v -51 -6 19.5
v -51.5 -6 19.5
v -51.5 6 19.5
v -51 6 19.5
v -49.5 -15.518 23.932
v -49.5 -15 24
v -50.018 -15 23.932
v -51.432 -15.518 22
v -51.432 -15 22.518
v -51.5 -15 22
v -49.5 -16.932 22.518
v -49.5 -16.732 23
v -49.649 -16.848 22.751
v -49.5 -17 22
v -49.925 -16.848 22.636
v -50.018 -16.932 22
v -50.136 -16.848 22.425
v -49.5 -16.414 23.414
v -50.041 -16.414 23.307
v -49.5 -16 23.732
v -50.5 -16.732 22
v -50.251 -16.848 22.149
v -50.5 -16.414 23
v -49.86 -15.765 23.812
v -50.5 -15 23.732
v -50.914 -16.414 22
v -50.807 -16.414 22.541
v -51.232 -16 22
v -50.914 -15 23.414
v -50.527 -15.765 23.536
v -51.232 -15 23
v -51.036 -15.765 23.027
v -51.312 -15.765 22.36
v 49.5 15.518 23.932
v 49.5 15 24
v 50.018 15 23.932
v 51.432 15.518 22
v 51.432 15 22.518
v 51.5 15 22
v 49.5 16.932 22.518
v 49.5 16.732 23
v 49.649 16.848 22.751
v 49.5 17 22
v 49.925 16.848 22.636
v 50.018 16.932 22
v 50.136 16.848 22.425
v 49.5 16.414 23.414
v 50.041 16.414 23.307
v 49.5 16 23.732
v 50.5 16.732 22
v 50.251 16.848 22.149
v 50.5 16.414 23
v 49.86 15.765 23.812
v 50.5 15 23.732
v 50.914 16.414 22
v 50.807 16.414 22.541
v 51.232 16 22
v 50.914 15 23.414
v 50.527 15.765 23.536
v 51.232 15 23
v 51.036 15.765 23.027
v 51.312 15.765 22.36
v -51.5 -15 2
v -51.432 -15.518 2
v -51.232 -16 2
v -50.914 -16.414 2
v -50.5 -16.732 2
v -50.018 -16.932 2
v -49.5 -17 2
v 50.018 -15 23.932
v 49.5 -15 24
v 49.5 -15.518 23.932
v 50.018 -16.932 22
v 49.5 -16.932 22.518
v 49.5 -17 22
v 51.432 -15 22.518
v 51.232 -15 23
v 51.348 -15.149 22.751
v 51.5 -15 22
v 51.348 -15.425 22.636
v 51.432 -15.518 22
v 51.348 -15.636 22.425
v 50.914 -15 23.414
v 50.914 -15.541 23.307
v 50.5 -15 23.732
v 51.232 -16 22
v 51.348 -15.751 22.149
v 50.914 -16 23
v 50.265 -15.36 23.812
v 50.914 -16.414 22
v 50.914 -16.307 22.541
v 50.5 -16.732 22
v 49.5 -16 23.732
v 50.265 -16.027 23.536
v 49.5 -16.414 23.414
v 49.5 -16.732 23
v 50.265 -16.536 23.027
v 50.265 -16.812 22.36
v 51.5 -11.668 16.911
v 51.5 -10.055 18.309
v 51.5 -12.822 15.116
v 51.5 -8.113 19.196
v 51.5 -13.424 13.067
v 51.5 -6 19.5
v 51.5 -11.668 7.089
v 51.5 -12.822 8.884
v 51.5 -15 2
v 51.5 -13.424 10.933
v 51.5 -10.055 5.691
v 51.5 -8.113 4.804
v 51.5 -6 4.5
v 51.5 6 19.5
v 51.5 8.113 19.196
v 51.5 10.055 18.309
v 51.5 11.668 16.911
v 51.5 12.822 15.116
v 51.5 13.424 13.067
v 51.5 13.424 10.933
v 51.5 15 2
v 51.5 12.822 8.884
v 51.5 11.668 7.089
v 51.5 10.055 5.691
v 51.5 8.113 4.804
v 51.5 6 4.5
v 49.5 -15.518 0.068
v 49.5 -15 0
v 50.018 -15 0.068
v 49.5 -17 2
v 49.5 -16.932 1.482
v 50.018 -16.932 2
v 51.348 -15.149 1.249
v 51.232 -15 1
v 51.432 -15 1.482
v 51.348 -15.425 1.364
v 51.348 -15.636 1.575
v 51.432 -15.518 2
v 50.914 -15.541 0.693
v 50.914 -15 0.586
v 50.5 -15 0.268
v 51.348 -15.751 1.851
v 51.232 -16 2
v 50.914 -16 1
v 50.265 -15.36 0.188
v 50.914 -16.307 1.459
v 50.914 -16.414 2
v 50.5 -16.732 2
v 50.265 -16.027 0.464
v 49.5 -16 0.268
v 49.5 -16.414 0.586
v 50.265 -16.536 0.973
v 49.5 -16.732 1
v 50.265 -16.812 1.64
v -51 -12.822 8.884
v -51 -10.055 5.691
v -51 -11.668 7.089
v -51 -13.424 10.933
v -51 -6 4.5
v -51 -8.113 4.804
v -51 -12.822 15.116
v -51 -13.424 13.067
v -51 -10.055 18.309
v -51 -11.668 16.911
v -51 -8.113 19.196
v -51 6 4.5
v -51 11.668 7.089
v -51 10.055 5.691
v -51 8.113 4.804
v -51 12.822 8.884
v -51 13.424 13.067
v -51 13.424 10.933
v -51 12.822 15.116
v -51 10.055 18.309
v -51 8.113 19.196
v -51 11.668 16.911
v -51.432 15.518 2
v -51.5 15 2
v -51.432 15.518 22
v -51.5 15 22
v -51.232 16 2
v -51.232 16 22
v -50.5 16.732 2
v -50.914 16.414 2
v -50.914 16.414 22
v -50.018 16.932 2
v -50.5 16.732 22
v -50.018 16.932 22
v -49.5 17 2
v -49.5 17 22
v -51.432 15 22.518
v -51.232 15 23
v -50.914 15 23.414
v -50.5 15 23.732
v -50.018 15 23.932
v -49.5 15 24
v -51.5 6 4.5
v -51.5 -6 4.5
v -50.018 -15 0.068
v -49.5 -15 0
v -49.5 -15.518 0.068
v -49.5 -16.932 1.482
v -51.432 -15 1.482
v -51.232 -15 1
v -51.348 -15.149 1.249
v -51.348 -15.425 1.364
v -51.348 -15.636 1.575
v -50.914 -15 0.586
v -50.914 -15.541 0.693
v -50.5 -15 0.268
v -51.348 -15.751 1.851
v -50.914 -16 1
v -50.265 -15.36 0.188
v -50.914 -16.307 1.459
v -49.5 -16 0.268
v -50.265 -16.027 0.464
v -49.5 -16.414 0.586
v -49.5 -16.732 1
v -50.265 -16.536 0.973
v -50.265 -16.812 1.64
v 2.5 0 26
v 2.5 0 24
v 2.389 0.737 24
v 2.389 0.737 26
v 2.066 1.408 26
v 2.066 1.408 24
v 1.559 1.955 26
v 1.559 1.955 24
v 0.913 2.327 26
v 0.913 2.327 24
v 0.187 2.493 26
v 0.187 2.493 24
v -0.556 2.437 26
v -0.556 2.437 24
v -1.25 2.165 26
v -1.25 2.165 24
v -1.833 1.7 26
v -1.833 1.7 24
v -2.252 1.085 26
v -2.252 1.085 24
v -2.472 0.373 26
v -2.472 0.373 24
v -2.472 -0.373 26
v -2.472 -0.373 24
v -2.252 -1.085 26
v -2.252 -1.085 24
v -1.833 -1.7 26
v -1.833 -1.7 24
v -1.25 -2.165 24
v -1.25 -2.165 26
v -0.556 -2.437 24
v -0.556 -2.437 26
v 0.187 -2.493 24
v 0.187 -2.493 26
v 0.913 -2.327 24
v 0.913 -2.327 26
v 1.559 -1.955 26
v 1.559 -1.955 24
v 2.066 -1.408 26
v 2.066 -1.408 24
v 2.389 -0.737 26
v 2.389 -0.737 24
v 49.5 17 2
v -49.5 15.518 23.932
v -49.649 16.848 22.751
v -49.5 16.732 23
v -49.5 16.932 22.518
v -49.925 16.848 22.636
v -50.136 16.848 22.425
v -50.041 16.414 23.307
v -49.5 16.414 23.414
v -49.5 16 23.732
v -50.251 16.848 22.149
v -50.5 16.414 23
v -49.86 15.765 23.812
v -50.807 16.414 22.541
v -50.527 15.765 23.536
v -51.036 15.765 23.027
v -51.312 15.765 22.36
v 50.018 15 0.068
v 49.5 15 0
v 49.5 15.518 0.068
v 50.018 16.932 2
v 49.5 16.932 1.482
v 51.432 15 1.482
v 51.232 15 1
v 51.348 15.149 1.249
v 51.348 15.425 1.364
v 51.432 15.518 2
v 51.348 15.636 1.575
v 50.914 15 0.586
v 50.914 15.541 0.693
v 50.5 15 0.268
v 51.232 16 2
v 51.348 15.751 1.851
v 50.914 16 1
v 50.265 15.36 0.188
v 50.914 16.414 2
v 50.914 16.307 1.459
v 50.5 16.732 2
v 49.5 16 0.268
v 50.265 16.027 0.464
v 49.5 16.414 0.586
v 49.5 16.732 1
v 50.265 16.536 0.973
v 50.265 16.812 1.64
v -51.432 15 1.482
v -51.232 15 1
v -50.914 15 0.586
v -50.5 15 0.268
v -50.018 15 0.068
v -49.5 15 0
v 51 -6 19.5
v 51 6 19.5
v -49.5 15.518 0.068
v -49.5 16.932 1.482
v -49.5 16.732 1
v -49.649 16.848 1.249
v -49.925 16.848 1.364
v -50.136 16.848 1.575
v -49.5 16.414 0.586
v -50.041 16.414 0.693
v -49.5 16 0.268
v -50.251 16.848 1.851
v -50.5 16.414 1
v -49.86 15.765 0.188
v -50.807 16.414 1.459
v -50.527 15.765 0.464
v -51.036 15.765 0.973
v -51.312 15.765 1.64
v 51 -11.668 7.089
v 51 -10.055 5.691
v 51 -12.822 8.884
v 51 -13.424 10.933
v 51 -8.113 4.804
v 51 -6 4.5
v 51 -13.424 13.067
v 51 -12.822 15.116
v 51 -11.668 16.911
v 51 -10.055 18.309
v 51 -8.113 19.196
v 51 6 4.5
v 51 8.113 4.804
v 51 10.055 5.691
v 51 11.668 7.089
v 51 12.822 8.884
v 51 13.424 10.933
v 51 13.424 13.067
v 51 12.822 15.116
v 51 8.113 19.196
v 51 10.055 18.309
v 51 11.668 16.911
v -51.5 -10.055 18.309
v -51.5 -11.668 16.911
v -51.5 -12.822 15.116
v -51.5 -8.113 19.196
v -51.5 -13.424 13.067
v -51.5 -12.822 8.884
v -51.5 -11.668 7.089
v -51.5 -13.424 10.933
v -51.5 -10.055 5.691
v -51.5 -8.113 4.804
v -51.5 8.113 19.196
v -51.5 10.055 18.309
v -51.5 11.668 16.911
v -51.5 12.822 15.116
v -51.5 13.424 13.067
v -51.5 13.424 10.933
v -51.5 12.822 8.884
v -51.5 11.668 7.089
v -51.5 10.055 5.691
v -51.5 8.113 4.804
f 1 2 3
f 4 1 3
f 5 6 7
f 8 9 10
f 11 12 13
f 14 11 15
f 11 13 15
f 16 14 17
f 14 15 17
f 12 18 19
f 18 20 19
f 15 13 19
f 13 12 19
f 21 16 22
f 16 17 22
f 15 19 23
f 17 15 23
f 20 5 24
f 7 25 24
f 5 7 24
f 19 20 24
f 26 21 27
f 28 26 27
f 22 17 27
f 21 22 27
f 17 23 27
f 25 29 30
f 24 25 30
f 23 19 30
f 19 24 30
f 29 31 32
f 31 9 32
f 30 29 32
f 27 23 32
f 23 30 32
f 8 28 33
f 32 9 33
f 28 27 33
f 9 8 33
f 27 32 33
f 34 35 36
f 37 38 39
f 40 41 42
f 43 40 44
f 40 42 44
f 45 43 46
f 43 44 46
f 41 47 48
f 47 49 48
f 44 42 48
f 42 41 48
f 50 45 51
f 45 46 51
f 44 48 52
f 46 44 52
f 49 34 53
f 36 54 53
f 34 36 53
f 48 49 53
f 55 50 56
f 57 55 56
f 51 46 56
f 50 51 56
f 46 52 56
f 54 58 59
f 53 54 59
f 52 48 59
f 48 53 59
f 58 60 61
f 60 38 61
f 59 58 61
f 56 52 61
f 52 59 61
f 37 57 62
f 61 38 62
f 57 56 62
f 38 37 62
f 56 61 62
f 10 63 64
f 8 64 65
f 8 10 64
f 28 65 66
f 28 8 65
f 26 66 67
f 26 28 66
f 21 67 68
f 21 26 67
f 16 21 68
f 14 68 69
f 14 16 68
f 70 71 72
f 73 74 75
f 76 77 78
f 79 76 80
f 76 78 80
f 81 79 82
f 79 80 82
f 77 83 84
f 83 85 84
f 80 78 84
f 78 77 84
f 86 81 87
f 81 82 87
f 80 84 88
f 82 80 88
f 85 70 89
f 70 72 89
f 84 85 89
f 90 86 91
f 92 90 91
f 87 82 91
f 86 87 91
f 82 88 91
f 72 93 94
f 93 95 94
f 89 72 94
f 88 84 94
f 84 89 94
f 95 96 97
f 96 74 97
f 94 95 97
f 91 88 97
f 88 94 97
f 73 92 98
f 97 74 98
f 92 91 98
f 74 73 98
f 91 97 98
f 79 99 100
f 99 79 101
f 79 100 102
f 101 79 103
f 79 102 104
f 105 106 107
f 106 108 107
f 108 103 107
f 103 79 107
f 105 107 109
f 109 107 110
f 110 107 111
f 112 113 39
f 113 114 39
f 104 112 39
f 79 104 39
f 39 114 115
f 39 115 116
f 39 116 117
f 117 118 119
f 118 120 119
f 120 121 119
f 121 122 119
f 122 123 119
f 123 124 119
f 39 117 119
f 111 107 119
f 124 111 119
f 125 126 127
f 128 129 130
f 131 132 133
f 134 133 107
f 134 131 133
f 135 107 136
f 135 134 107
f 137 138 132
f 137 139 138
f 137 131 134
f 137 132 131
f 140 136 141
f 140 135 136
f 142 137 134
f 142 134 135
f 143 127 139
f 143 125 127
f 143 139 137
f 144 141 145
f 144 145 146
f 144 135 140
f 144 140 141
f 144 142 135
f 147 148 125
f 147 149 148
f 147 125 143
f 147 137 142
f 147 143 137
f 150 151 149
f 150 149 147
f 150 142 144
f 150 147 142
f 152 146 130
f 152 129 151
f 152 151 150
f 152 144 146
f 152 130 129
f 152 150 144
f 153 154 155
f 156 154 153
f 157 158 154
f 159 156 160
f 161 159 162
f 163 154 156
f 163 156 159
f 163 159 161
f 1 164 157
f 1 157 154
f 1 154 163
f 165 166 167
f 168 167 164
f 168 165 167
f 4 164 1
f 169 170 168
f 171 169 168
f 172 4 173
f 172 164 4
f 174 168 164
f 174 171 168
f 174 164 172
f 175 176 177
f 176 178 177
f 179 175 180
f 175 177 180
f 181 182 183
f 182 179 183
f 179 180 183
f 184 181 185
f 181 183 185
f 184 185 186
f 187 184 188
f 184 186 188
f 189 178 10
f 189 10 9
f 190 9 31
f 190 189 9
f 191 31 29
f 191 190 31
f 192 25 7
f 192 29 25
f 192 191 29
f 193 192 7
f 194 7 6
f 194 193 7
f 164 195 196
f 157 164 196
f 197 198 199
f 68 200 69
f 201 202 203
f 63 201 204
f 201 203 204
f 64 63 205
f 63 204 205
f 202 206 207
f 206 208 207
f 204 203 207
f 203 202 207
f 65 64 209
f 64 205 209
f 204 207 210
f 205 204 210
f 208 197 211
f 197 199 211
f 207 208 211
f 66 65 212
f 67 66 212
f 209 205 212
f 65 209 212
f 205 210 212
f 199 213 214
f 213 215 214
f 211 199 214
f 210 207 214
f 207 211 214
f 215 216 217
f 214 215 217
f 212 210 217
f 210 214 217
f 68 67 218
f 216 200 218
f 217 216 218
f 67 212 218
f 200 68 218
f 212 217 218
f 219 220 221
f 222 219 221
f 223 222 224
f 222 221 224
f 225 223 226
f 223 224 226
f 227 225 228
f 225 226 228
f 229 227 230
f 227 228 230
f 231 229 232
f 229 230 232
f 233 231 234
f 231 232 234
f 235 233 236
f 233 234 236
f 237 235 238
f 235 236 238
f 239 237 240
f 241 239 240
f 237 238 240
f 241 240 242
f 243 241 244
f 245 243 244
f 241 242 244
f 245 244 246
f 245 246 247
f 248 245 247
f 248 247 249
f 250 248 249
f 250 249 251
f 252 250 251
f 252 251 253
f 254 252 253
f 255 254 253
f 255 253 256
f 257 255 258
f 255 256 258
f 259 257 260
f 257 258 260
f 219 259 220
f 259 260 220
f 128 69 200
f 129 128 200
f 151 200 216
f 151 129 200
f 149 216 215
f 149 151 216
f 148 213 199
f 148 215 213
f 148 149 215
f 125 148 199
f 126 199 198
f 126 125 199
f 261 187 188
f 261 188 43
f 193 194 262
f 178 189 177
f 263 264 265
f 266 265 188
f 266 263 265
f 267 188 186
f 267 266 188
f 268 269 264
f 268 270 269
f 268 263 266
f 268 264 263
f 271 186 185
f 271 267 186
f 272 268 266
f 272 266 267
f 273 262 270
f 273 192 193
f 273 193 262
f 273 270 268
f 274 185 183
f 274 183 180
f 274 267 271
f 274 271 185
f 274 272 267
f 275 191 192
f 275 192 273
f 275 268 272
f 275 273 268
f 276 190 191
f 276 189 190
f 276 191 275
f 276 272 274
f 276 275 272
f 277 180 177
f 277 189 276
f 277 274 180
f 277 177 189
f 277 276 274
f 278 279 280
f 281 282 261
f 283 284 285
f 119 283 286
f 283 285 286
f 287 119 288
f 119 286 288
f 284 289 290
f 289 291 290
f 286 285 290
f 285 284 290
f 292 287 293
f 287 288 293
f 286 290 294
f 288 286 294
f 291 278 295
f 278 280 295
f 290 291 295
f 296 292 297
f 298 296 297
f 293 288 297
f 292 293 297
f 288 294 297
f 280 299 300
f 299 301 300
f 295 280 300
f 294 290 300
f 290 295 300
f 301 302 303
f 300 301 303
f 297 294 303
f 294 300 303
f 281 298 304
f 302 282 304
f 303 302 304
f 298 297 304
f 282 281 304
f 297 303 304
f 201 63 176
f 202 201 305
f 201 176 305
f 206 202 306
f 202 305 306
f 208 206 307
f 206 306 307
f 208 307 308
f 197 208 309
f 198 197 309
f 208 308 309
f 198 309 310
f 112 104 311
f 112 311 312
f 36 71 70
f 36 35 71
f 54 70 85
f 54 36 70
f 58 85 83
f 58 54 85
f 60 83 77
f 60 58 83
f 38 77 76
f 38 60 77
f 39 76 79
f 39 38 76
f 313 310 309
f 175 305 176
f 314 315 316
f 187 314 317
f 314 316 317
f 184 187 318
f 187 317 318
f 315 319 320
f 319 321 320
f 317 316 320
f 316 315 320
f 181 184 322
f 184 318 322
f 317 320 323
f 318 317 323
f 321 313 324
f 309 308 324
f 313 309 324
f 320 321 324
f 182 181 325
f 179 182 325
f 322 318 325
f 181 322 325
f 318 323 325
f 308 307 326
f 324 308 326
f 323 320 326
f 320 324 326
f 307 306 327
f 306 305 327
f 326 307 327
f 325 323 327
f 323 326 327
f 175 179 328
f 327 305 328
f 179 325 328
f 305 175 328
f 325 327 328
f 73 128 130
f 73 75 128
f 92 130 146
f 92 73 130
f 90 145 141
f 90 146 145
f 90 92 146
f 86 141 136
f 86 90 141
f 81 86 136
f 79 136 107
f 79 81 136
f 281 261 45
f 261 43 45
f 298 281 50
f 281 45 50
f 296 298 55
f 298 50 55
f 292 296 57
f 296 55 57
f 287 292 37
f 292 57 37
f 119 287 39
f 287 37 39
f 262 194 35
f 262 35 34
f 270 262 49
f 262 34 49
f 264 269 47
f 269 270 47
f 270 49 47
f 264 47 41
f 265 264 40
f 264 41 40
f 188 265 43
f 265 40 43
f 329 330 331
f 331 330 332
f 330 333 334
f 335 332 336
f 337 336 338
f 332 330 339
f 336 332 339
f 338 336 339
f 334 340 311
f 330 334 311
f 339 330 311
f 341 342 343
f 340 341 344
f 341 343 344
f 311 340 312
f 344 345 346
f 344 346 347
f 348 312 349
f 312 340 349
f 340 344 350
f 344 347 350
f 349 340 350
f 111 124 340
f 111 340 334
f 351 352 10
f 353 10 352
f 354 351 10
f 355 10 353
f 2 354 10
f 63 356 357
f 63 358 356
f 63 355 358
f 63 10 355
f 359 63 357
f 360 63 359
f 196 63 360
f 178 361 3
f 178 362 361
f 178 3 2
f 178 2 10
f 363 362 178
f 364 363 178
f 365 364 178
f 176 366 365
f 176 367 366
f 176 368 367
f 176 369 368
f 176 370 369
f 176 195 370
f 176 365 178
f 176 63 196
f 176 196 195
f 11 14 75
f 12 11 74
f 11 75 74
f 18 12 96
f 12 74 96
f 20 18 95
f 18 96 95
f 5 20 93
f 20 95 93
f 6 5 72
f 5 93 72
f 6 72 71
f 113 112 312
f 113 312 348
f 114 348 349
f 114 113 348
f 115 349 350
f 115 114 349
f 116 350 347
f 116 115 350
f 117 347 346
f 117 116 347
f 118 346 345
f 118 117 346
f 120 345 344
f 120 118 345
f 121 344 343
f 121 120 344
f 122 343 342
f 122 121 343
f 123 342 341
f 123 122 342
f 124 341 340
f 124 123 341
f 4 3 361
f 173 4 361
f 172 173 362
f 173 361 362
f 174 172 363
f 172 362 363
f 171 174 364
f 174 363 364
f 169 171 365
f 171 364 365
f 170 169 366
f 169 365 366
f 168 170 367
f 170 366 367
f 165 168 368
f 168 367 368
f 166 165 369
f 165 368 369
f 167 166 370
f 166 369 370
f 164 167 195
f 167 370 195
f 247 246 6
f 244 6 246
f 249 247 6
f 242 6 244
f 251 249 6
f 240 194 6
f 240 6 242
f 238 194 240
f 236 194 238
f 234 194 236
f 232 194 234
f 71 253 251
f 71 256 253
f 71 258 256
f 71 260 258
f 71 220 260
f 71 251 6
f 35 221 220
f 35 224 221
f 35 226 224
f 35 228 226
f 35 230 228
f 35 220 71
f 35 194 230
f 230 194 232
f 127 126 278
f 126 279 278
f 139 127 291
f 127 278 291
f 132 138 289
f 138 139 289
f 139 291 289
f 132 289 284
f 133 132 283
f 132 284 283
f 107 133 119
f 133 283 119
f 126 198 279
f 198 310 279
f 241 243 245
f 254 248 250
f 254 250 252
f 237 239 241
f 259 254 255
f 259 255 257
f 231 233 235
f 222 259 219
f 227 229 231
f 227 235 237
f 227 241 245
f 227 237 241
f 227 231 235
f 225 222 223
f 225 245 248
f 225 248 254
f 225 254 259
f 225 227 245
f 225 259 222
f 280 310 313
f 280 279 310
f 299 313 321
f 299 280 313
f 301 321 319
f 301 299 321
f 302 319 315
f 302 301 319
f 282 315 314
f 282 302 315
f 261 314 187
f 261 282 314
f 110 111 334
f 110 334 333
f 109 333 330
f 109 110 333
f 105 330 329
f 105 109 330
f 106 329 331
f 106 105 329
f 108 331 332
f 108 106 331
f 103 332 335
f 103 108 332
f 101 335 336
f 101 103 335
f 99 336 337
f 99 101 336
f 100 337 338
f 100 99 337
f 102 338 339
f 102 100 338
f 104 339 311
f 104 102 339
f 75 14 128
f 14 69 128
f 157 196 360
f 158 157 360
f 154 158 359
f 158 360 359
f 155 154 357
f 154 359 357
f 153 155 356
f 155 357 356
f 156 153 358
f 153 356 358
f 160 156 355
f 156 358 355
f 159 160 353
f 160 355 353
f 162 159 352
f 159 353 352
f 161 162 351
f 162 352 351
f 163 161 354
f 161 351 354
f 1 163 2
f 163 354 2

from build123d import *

# Parameters (mm, degrees)
ESBO_O1_W                = 103
ESBO_O1_H                = 34
RESSALTO_EXTRUS_O1_DEPTH = 24
CORTE_EXTRUS_O1_DEPTH    = 0.5
FILETE1_R                = 2
SKETCH1_R                = 2.5
BOSS_EXTRUDE1_DEPTH      = 2


with BuildPart() as part:
    # Esboço1 → Ressalto-extrusão1 (new body)
    with BuildSketch(Plane.XY):
        Rectangle(ESBO_O1_W, ESBO_O1_H)
    extrude(amount=RESSALTO_EXTRUS_O1_DEPTH)

    # Esboço2 → Corte-extrusão1 (cut)
    with BuildSketch(Plane(origin=(51.5, 0, 0), x_dir=(0, 0, -1), z_dir=(1, 0, 0))):
        with BuildLine():
            Line((-4.5, 6), (-4.5, -6))
            ThreePointArc((-4.5, -6), (-12, -13.5), (-19.5, -6))
            Line((-19.5, -6), (-19.5, 6))
            ThreePointArc((-19.5, 6), (-12, 13.5), (-4.5, 6))
        make_face()
    corte_extrus_o1 = extrude(amount=-CORTE_EXTRUS_O1_DEPTH, mode=Mode.SUBTRACT)

    # Espelhar1: Corte-extrusão1 across plane
    add(corte_extrus_o1.mirror(Plane(origin=(0, 0, 0), x_dir=(0, 0, 1), z_dir=(1, 0, 0))), mode=Mode.SUBTRACT)

    # Filete1
    filete1_edges = [part.edges().sort_by_distance(p)[0] for p in [
        (-51.5, 0, 24),
        (0, -17, 24),
        (51.5, 0, 24),
        (0, -17, 0),
        (-51.5, 0, 0),
        (0, 17, 0),
        (51.5, 0, 0),
        (0, 17, 24),
        (51.5, -17, 12),
        (-51.5, -17, 12),
        (-51.5, 17, 12),
        (51.5, 17, 12),
    ]]
    fillet(filete1_edges, radius=FILETE1_R)

    # Sketch1 → Boss-Extrude1 (add)
    with BuildSketch(Plane.XY.offset(24)):
        Circle(SKETCH1_R)
    extrude(amount=BOSS_EXTRUDE1_DEPTH)


solid = part.part
